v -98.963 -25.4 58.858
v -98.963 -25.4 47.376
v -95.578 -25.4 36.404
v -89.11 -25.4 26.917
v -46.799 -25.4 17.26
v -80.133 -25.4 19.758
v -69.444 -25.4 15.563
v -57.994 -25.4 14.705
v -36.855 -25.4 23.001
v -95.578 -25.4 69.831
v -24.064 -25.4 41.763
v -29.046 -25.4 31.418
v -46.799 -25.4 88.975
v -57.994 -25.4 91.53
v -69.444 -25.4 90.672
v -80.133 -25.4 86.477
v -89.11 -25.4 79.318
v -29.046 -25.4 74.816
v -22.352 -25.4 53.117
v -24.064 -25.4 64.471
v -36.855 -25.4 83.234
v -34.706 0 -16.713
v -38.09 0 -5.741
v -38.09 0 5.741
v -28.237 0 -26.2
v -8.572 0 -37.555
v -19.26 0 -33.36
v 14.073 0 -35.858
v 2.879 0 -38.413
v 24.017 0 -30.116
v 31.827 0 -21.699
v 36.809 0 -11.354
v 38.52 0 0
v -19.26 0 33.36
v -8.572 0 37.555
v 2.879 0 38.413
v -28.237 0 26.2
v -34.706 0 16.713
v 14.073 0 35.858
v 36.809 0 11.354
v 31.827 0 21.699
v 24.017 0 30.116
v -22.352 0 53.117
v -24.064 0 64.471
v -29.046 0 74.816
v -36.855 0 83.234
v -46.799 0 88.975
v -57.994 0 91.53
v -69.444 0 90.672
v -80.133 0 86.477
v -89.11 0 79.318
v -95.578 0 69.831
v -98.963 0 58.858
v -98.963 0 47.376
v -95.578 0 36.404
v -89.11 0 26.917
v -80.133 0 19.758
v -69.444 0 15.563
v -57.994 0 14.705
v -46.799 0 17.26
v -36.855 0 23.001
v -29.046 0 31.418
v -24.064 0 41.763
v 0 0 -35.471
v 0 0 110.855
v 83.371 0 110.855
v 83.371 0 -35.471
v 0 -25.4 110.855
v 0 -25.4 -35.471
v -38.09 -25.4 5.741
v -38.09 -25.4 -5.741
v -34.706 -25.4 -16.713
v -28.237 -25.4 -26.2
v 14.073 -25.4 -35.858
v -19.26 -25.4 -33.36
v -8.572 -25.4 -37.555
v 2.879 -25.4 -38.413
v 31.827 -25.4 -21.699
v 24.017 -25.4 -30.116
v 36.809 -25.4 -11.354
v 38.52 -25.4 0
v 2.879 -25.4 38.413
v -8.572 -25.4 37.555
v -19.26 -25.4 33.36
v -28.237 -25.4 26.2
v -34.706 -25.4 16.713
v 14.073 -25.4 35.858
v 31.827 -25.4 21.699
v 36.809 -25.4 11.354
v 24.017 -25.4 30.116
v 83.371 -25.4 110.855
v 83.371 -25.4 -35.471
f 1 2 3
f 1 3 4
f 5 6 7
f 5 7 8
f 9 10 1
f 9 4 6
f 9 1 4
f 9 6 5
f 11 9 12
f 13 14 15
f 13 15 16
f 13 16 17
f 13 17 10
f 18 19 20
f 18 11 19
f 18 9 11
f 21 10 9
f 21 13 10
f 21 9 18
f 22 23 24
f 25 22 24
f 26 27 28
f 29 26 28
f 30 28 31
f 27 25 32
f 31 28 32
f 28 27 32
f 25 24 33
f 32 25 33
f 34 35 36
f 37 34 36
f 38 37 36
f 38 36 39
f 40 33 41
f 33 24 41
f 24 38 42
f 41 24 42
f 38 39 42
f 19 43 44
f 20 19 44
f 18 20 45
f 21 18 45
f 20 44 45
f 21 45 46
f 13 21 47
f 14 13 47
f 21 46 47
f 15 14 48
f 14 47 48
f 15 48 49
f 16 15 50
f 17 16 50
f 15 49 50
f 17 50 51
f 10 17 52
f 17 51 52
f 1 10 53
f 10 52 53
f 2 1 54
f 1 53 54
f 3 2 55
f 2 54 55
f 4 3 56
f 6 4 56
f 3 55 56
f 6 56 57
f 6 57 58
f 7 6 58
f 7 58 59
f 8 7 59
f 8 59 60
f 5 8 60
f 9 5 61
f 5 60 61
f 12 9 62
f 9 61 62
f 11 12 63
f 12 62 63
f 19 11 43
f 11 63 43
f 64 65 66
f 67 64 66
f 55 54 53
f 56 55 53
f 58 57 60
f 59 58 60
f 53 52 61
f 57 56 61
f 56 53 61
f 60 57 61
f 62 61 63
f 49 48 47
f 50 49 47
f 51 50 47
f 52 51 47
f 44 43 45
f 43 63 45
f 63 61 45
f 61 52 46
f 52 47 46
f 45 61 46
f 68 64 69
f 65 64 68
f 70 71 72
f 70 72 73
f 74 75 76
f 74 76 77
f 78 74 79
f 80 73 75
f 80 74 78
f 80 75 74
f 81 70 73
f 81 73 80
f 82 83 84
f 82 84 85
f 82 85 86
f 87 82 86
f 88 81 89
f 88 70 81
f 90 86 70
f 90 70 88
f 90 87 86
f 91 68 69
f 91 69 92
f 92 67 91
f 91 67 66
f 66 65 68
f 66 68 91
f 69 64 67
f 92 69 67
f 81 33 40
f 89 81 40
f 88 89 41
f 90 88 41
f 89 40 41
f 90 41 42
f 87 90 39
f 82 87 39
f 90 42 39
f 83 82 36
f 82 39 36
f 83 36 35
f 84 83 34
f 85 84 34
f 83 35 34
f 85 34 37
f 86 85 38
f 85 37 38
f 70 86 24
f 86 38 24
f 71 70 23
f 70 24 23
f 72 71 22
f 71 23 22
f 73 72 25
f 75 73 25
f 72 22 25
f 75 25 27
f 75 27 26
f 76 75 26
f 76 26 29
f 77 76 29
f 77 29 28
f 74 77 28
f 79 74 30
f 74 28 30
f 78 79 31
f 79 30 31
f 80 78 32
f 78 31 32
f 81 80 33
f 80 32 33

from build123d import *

# Parameters (mm, degrees)
F0_R     = 38.520309
F1_DEPTH = 25.4
F2_W     = 83.371088
F2_H     = 146.3264
F3_DEPTH = 25.4


with BuildPart() as f1:
    # F0 (on Front) → F1 (new body)
    with BuildSketch(Plane.XZ):
        with Locations((-60.872503, 53.117219)):
            Circle(F0_R)
        Circle(F0_R)
    extrude(amount=F1_DEPTH)


with BuildPart() as f3:
    # F2 (on Front) → F3 (new body)
    with BuildSketch(Plane.XZ):
        with Locations((41.685544, 37.692029)):
            Rectangle(F2_W, F2_H)
    extrude(amount=F3_DEPTH)


solid = Compound([f1.part, f3.part])
